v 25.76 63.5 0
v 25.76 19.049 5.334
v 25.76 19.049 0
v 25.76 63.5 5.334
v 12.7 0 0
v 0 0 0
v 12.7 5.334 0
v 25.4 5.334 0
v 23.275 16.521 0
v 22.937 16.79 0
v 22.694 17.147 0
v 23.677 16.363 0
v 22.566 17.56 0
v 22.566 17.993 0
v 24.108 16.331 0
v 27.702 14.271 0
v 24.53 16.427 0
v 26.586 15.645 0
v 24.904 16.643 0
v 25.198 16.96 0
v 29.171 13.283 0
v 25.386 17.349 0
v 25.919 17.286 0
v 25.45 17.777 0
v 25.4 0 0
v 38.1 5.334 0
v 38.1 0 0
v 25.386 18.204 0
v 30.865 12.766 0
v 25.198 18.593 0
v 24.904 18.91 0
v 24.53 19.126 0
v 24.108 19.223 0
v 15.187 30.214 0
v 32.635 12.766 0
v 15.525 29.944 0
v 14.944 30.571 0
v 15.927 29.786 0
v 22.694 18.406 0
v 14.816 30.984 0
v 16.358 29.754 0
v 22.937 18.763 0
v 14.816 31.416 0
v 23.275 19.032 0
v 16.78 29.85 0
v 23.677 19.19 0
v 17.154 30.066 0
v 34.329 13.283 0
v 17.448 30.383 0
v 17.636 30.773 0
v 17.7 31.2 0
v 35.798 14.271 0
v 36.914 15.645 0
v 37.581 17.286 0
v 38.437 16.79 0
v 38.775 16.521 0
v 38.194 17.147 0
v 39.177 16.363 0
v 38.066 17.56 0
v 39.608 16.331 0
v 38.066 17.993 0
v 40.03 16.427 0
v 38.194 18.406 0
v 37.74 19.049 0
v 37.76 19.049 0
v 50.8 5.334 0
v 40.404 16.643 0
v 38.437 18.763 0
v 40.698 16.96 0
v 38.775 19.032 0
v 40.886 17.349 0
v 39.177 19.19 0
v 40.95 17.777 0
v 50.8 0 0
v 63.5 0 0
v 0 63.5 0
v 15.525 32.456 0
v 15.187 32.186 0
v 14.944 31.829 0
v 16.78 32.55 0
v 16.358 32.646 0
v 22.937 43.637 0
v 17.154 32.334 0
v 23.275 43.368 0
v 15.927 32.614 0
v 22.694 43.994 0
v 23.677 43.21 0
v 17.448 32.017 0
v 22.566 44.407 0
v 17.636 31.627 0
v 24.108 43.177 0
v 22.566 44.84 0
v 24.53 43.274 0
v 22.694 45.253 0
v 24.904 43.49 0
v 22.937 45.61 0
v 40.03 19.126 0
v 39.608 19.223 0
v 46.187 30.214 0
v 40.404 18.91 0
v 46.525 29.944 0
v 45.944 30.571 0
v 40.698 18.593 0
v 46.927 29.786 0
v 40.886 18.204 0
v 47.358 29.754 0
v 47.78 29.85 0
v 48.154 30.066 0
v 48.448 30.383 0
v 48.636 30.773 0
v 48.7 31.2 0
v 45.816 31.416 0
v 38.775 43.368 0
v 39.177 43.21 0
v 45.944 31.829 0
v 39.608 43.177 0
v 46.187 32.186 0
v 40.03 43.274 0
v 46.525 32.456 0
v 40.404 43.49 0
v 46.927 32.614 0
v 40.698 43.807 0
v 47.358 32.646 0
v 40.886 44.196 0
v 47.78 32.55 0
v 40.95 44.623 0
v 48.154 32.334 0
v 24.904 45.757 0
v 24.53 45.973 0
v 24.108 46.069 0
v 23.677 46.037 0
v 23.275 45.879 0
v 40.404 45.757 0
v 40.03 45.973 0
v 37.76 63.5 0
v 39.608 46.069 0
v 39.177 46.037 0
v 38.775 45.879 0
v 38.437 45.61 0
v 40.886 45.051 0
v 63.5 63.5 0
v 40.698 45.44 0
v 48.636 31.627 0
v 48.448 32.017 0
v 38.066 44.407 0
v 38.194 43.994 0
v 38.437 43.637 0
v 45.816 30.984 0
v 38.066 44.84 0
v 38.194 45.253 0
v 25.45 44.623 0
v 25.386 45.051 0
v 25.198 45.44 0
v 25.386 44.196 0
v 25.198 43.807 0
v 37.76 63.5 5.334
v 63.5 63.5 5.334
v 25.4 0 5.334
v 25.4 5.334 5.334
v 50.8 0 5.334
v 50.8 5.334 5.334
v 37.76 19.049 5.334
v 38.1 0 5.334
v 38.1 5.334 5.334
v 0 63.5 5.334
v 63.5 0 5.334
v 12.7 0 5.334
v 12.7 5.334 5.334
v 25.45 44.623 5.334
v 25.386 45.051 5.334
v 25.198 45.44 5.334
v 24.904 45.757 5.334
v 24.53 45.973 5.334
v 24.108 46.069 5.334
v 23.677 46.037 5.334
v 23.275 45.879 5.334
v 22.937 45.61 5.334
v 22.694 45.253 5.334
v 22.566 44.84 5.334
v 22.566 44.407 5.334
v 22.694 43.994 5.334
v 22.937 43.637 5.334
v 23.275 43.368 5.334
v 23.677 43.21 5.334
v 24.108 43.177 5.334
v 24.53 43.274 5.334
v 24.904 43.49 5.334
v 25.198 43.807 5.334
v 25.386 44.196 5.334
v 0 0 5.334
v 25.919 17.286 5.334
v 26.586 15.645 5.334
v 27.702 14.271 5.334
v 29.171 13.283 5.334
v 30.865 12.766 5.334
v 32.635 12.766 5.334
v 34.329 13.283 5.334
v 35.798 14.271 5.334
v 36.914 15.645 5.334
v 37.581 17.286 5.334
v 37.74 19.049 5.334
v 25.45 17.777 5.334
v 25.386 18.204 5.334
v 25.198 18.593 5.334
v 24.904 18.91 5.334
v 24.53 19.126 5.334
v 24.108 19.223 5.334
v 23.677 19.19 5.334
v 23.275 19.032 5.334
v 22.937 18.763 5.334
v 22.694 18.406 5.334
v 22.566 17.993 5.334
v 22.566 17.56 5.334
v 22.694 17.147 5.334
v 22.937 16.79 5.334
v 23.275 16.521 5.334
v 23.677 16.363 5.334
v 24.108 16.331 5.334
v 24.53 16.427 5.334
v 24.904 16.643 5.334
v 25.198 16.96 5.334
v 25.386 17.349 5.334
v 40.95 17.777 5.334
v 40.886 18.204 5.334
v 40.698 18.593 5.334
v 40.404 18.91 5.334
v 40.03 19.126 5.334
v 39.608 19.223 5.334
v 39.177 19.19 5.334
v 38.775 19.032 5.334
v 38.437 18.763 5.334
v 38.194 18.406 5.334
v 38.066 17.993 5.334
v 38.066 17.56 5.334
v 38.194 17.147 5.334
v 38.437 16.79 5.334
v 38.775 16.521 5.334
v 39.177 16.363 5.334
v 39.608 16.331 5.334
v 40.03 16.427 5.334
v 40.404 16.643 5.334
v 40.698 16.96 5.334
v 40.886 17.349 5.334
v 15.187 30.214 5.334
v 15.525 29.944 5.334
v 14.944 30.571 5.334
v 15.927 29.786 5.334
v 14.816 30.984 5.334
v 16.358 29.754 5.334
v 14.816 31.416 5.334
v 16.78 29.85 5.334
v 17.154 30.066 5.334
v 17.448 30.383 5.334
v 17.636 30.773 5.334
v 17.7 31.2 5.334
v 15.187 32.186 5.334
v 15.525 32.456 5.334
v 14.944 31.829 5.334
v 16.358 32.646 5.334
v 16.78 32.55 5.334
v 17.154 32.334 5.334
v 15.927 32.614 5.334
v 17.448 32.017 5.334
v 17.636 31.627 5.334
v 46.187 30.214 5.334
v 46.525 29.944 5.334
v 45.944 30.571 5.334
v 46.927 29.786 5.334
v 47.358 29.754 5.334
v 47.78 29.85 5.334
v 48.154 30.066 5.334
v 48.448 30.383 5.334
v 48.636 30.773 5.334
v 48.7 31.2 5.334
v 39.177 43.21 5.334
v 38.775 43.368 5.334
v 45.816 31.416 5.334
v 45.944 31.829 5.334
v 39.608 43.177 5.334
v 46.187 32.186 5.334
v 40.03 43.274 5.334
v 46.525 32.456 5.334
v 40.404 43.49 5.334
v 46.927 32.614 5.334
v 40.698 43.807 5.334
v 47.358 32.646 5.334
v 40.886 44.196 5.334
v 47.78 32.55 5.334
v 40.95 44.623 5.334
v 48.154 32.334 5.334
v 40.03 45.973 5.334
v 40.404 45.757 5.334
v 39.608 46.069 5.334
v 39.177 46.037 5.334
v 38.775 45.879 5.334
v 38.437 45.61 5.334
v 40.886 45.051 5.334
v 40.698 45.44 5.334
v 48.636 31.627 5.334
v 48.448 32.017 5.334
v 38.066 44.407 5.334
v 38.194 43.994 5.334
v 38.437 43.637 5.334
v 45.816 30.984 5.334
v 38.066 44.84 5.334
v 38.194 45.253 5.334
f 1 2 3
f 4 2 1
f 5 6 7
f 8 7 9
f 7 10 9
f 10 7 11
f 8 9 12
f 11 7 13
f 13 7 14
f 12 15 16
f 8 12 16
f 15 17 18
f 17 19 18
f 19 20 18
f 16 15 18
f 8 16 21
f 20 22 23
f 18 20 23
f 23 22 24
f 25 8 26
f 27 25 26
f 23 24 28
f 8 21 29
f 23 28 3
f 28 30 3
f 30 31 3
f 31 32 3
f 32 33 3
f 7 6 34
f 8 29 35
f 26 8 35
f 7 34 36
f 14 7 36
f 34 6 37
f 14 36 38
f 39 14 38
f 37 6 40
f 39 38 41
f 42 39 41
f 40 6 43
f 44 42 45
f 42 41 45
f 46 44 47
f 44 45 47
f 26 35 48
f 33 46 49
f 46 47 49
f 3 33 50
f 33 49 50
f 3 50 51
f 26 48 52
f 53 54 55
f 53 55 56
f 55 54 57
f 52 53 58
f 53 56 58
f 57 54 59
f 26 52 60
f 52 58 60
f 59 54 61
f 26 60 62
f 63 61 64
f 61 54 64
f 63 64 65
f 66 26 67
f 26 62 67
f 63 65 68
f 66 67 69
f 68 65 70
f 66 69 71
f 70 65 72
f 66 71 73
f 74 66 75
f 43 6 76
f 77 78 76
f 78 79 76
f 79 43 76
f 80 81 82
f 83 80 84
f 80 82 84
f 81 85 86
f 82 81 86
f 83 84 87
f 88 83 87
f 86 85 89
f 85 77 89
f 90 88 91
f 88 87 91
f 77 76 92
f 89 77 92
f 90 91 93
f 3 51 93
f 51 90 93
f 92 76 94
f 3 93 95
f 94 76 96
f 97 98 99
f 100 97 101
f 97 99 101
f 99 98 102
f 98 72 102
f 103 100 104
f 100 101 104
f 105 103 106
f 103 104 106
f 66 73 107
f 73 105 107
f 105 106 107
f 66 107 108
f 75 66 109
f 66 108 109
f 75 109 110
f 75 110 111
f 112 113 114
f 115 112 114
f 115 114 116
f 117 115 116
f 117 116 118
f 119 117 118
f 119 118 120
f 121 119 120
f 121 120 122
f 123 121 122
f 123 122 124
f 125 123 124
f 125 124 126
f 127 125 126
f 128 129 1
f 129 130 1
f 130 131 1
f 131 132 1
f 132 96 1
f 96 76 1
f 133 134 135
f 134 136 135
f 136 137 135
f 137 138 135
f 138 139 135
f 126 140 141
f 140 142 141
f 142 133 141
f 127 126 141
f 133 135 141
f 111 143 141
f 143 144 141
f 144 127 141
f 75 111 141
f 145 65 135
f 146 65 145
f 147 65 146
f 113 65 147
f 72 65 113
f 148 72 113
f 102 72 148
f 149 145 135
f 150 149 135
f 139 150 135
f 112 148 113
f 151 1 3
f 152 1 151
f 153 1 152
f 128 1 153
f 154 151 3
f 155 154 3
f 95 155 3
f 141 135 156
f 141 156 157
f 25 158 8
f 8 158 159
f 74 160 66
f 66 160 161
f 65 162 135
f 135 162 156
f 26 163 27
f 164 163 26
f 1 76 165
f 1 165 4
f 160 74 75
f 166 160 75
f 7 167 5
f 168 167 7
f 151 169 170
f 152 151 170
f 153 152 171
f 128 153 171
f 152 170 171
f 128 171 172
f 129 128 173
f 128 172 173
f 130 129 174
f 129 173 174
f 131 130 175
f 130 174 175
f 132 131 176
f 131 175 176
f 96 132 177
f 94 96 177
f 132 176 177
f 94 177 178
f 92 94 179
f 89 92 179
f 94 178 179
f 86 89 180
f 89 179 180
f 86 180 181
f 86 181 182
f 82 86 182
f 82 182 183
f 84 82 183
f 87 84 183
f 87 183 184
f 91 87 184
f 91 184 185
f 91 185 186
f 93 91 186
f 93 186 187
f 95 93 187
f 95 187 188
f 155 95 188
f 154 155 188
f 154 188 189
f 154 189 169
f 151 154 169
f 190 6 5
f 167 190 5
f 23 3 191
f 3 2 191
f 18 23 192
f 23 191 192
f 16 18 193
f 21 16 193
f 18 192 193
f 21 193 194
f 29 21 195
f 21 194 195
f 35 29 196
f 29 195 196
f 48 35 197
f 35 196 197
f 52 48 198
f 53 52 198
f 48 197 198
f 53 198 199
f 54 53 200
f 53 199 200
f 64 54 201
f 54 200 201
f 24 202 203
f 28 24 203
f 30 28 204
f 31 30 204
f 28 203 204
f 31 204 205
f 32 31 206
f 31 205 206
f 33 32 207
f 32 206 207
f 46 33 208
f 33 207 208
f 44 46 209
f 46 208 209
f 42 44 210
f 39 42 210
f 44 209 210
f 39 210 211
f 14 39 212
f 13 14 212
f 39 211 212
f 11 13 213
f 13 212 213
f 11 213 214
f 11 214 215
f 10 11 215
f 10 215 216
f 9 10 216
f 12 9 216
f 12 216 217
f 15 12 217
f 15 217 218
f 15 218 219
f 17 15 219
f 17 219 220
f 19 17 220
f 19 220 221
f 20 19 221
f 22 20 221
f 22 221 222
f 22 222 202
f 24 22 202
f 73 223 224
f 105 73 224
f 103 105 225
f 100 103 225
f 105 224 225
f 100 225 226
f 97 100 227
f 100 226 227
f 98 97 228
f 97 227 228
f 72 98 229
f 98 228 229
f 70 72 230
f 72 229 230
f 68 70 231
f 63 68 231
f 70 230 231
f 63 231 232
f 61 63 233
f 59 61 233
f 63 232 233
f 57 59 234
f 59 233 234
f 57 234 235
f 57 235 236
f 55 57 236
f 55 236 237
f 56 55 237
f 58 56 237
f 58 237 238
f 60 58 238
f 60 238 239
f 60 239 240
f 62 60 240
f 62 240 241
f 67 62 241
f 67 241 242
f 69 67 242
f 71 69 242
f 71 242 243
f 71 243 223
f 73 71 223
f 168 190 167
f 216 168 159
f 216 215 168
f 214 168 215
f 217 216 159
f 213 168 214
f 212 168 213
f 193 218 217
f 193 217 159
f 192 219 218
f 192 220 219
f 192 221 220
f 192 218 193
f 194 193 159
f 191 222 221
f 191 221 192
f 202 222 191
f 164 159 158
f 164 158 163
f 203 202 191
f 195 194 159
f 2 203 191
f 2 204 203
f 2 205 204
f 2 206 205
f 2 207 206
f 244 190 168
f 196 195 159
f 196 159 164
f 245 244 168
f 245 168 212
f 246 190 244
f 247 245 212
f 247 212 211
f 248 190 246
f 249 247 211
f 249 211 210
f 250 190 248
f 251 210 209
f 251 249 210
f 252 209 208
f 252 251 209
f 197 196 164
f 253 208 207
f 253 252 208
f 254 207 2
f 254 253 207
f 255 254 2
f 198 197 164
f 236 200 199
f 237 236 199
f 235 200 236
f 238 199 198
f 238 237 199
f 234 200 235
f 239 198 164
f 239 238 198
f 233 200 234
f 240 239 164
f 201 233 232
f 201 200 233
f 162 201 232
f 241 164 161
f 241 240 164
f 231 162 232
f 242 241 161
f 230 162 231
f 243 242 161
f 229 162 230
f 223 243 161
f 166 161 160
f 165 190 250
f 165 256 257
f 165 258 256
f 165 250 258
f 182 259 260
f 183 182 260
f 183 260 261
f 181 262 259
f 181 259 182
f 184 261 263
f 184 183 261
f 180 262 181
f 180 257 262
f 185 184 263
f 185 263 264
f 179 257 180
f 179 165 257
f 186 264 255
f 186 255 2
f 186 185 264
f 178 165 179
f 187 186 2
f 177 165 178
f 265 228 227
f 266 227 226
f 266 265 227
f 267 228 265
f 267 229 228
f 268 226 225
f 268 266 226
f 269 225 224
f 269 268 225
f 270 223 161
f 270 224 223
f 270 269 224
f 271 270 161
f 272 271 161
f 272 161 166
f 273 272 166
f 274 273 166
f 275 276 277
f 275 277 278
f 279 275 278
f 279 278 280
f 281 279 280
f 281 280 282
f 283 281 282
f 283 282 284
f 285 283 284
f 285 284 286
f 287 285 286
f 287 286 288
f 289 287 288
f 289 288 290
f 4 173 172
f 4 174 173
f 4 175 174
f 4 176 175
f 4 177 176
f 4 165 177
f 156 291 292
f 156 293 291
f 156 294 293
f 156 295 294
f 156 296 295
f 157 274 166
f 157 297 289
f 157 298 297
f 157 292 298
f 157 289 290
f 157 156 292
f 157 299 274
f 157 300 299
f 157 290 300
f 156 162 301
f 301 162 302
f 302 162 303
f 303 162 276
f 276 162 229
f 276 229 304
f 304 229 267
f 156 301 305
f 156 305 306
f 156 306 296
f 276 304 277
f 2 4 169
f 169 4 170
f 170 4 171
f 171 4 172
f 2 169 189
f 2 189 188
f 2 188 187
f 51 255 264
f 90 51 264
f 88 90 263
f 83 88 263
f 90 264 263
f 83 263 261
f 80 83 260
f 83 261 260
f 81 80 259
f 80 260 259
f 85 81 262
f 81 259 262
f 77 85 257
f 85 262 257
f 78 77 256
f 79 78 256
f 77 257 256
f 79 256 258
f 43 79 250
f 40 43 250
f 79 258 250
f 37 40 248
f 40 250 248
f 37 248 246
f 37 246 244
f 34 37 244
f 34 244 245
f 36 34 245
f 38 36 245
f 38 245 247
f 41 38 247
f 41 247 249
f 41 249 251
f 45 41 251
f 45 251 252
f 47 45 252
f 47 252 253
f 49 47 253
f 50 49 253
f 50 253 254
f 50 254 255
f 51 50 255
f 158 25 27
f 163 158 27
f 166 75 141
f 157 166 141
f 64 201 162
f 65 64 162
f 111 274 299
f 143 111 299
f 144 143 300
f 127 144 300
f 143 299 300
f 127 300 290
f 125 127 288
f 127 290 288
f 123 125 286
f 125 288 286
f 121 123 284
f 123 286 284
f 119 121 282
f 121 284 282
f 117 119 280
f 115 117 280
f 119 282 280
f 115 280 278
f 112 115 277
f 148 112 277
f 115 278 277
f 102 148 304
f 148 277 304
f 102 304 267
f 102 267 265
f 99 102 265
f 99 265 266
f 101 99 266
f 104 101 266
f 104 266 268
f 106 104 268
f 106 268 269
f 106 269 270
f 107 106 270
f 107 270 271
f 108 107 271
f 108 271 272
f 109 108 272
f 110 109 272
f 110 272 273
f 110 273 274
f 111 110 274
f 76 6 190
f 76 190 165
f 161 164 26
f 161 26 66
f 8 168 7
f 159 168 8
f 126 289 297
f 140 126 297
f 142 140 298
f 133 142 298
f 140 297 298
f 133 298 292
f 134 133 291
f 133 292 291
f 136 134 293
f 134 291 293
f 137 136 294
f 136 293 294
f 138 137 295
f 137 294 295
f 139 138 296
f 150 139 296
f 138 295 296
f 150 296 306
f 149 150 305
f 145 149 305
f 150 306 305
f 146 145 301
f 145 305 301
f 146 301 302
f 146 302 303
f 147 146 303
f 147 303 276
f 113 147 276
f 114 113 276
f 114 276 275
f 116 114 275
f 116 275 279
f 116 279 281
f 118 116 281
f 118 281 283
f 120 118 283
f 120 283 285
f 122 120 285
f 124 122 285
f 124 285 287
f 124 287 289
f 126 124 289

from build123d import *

# Parameters (mm, degrees)
SKETCH2_W           = 63.5
SKETCH2_H           = 63.5
BOSS_EXTRUDE1_DEPTH = 5.334
SKETCH4_W           = 12.7
SKETCH4_H           = 5.334
CUT_EXTRUDE1_DEPTH  = 5.334
SKETCH5_R           = 5.999999938
CUT_EXTRUDE2_DEPTH  = 5.334
SKETCH6_W           = 12
SKETCH6_H           = 44.450593975
CUT_EXTRUDE3_DEPTH  = 5.334
SKETCH7_R           = 1.45
CUT_EXTRUDE4_DEPTH  = 90.960833455


with BuildPart() as part:
    # Sketch2 → Boss-Extrude1 (new body)
    with BuildSketch(Plane.XY):
        with Locations((31.75, 31.75)):
            Rectangle(SKETCH2_W, SKETCH2_H)
    extrude(amount=BOSS_EXTRUDE1_DEPTH)

    # Sketch4 → Cut-Extrude1 (cut)
    with BuildSketch(Plane.XY.offset(5.334)):
        with Locations((19.05, 2.667)):
            Rectangle(SKETCH4_W, SKETCH4_H)
        with Locations((44.45, 2.667)):
            Rectangle(SKETCH4_W, SKETCH4_H)
    extrude(amount=-CUT_EXTRUDE1_DEPTH, mode=Mode.SUBTRACT)

    # Sketch5 → Cut-Extrude2 (cut)
    with BuildSketch(Plane.XY.offset(5.334)):
        with Locations((31.75, 18.699999938)):
            Circle(SKETCH5_R)
    extrude(amount=-CUT_EXTRUDE2_DEPTH, mode=Mode.SUBTRACT)

    # Sketch6 → Cut-Extrude3 (cut)
    with BuildSketch(Plane.XY.offset(5.334)):
        with Locations((31.76018242, 41.274703013)):
            Rectangle(SKETCH6_W, SKETCH6_H)
    extrude(amount=-CUT_EXTRUDE3_DEPTH, mode=Mode.SUBTRACT)

    # Sketch7 → Cut-Extrude4 (cut, through all)
    with BuildSketch(Plane.XY.offset(5.334)):
        with Locations((47.25, 31.199999957)):
            Circle(SKETCH7_R)
        with Locations((39.5, 17.776606198)):
            Circle(SKETCH7_R)
        with Locations((24, 17.776606198)):
            Circle(SKETCH7_R)
        with Locations((16.25, 31.199999957)):
            Circle(SKETCH7_R)
        with Locations((24, 44.623393716)):
            Circle(SKETCH7_R)
        with Locations((39.5, 44.623393716)):
            Circle(SKETCH7_R)
    extrude(amount=-CUT_EXTRUDE4_DEPTH, mode=Mode.SUBTRACT)


solid = part.part
